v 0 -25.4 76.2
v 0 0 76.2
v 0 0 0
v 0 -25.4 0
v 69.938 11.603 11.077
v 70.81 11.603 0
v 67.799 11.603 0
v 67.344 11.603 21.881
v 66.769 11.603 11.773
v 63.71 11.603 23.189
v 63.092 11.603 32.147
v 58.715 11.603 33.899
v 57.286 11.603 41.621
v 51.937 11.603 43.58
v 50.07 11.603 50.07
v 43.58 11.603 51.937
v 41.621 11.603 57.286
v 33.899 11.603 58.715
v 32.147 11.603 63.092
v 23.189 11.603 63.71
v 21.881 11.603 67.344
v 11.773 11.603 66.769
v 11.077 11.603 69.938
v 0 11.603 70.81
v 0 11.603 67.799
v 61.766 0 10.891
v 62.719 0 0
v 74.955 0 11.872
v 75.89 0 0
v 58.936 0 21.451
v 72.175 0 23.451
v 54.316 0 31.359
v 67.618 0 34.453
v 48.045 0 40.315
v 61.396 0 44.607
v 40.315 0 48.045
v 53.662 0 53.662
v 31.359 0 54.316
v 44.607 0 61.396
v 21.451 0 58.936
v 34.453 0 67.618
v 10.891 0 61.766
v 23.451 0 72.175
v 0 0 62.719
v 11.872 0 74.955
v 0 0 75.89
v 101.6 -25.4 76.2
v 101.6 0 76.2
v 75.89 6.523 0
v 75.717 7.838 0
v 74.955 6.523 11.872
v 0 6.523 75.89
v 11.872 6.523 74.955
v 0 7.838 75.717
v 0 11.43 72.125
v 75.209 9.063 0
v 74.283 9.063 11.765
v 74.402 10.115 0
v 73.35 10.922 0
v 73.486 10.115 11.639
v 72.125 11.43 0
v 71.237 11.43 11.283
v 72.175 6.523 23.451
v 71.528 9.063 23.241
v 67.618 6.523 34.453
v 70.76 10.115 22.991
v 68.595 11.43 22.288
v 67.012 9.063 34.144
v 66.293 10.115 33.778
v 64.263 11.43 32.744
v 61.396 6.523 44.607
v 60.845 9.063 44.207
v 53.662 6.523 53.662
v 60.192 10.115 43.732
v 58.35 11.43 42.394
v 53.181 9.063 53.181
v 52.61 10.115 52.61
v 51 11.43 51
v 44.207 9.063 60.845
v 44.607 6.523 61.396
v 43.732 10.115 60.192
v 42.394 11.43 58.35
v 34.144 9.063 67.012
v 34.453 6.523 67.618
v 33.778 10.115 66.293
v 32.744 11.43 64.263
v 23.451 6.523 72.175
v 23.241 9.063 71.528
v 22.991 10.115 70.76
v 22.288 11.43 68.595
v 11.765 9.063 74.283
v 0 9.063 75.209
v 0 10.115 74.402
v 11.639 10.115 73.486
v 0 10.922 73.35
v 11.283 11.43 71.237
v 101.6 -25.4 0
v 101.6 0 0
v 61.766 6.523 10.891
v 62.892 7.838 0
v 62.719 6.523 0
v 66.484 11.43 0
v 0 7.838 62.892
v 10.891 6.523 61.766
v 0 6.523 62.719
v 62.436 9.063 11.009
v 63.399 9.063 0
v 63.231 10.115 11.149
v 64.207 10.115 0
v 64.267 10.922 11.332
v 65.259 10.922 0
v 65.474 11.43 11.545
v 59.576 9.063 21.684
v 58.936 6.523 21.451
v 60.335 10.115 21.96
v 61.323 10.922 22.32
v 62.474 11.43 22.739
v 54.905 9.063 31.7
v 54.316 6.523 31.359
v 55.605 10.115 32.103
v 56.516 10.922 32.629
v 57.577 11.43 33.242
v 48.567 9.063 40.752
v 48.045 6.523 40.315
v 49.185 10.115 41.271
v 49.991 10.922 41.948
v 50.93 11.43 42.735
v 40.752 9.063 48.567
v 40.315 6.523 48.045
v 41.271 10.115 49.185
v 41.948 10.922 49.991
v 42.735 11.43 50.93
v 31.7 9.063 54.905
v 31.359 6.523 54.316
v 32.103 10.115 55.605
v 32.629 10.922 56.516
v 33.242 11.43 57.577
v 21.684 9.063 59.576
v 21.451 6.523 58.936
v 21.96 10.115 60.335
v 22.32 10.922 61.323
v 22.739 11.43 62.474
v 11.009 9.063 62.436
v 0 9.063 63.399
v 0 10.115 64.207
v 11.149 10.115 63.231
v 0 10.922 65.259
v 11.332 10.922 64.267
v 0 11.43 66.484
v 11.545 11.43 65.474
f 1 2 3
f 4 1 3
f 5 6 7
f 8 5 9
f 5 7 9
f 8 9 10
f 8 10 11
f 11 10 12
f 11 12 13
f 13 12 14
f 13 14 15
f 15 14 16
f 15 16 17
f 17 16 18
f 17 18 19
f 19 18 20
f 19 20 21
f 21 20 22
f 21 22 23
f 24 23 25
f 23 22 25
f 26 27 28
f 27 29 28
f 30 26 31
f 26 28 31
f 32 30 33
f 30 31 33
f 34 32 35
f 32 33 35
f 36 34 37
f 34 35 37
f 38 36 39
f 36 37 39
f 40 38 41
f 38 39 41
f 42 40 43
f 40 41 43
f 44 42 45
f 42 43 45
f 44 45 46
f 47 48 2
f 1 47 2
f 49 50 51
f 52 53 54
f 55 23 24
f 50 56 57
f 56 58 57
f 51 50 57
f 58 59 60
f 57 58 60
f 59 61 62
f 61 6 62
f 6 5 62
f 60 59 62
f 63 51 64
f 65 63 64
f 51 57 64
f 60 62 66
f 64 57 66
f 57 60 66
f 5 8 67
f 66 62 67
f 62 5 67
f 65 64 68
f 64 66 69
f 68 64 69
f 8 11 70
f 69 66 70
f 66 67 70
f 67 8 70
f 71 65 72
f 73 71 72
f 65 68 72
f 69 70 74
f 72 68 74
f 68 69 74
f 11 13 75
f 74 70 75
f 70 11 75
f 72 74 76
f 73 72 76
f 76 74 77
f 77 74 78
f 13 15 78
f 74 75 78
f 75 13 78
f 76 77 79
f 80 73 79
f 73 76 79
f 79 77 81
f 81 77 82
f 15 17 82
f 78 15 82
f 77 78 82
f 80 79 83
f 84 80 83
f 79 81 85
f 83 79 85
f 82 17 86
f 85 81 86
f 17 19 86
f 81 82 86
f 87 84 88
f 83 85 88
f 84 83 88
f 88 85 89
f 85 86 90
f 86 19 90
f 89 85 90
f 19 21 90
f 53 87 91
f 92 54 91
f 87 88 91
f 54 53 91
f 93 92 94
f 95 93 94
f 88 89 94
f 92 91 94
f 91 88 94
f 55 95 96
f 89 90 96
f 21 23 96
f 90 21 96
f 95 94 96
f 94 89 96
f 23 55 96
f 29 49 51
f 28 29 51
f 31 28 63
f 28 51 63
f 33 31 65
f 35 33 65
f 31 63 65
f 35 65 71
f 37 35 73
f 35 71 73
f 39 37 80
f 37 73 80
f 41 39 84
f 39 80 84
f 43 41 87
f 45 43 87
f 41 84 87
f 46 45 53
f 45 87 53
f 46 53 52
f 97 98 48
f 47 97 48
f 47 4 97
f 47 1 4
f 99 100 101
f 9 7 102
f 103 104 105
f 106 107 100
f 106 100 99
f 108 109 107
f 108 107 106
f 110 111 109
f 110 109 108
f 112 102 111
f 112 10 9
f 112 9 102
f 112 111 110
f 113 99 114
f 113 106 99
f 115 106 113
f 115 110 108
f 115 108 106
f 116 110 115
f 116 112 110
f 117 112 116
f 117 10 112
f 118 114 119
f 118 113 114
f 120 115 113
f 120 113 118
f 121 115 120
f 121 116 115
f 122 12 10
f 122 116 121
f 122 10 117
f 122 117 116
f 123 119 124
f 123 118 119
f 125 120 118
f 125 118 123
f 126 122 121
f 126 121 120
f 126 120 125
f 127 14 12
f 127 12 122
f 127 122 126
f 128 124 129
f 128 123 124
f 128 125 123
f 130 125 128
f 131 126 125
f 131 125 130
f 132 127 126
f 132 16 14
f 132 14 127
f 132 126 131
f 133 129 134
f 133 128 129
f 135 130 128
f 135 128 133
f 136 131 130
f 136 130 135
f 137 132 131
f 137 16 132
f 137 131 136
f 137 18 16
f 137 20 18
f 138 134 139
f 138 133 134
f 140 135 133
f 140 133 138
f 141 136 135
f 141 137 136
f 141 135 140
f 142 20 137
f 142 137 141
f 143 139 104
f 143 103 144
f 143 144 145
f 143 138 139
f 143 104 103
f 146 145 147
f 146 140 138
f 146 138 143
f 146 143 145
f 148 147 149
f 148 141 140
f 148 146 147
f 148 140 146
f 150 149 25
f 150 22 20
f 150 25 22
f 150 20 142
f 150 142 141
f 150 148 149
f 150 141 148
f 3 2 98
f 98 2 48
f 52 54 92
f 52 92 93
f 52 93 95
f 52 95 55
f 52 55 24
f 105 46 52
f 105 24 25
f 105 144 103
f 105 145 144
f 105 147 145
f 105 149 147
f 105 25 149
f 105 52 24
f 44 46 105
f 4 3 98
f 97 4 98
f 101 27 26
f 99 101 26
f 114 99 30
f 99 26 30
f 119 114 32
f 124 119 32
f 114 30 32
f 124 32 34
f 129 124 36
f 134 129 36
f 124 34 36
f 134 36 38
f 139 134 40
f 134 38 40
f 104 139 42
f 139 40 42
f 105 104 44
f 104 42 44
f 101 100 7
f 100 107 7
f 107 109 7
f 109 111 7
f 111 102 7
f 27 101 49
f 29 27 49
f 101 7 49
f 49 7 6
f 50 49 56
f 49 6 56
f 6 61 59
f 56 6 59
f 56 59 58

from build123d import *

# Parameters (mm, degrees)
F1_DEPTH = 12.7
F2_W     = 13.1709426641
F2_H     = 11.6029726341
F4_DEPTH = 25.4
F5_DEPTH = 12.7
F6_R     = 5.08


with BuildPart() as f1:
    # F0 (on Front) → F1 (new body)
    with BuildSketch(Plane.XZ):
        with BuildLine():
            Line((0, 76.2), (0, 0))
            Line((0, 0), (76.2, 0))
            ThreePointArc((76.2, 0), (53.8815367264, 53.8815367264), (0, 76.2))
        make_face()
        with BuildLine():
            ThreePointArc((0, 76.2), (53.8815367264, 53.8815367264), (76.2, 0))
            Line((76.2, 0), (101.6, 0))
            Line((101.6, 0), (101.6, 76.2))
            Line((101.6, 76.2), (0, 76.2))
        make_face()
    extrude(amount=F1_DEPTH)

    # F0 (on Front) → F4 (join)
    with BuildSketch(Plane.XZ):
        with BuildLine():
            ThreePointArc((0, 76.2), (53.8815367264, 53.8815367264), (76.2, 0))
            Line((76.2, 0), (101.6, 0))
            Line((101.6, 0), (101.6, 76.2))
            Line((101.6, 76.2), (0, 76.2))
        make_face()
    extrude(amount=F4_DEPTH)

    # F5 (add): a face of the model
    f5_faces = [f1.faces().sort_by_distance(p)[0] for p in [
        (32.3402844363, -12.7, 32.3402844363),
    ]]
    extrude(f5_faces, amount=F5_DEPTH)


with BuildPart() as f3:
    # F3: sweep along a path in F0
    with BuildLine(Plane.XZ) as f3_path:
        ThreePointArc((76.2, 0), (53.8815367264, 53.8815367264), (0, 76.2))
    # F2 (on Top) → F3 (sweep)
    with BuildSketch(Plane.XY):
        with Locations((69.3042650819, 5.8014863171)):
            Rectangle(F2_W, F2_H)
    sweep(path=f3_path.line)

    # F6
    f6_edges = [f3.edges().sort_by_distance(p)[0] for p in [
        (53.662147, 11.602973, 53.662147),
        (44.348884, 11.602973, 44.348884),
    ]]
    fillet(f6_edges, radius=F6_R)


solid = Compound([f1.part, f3.part])
